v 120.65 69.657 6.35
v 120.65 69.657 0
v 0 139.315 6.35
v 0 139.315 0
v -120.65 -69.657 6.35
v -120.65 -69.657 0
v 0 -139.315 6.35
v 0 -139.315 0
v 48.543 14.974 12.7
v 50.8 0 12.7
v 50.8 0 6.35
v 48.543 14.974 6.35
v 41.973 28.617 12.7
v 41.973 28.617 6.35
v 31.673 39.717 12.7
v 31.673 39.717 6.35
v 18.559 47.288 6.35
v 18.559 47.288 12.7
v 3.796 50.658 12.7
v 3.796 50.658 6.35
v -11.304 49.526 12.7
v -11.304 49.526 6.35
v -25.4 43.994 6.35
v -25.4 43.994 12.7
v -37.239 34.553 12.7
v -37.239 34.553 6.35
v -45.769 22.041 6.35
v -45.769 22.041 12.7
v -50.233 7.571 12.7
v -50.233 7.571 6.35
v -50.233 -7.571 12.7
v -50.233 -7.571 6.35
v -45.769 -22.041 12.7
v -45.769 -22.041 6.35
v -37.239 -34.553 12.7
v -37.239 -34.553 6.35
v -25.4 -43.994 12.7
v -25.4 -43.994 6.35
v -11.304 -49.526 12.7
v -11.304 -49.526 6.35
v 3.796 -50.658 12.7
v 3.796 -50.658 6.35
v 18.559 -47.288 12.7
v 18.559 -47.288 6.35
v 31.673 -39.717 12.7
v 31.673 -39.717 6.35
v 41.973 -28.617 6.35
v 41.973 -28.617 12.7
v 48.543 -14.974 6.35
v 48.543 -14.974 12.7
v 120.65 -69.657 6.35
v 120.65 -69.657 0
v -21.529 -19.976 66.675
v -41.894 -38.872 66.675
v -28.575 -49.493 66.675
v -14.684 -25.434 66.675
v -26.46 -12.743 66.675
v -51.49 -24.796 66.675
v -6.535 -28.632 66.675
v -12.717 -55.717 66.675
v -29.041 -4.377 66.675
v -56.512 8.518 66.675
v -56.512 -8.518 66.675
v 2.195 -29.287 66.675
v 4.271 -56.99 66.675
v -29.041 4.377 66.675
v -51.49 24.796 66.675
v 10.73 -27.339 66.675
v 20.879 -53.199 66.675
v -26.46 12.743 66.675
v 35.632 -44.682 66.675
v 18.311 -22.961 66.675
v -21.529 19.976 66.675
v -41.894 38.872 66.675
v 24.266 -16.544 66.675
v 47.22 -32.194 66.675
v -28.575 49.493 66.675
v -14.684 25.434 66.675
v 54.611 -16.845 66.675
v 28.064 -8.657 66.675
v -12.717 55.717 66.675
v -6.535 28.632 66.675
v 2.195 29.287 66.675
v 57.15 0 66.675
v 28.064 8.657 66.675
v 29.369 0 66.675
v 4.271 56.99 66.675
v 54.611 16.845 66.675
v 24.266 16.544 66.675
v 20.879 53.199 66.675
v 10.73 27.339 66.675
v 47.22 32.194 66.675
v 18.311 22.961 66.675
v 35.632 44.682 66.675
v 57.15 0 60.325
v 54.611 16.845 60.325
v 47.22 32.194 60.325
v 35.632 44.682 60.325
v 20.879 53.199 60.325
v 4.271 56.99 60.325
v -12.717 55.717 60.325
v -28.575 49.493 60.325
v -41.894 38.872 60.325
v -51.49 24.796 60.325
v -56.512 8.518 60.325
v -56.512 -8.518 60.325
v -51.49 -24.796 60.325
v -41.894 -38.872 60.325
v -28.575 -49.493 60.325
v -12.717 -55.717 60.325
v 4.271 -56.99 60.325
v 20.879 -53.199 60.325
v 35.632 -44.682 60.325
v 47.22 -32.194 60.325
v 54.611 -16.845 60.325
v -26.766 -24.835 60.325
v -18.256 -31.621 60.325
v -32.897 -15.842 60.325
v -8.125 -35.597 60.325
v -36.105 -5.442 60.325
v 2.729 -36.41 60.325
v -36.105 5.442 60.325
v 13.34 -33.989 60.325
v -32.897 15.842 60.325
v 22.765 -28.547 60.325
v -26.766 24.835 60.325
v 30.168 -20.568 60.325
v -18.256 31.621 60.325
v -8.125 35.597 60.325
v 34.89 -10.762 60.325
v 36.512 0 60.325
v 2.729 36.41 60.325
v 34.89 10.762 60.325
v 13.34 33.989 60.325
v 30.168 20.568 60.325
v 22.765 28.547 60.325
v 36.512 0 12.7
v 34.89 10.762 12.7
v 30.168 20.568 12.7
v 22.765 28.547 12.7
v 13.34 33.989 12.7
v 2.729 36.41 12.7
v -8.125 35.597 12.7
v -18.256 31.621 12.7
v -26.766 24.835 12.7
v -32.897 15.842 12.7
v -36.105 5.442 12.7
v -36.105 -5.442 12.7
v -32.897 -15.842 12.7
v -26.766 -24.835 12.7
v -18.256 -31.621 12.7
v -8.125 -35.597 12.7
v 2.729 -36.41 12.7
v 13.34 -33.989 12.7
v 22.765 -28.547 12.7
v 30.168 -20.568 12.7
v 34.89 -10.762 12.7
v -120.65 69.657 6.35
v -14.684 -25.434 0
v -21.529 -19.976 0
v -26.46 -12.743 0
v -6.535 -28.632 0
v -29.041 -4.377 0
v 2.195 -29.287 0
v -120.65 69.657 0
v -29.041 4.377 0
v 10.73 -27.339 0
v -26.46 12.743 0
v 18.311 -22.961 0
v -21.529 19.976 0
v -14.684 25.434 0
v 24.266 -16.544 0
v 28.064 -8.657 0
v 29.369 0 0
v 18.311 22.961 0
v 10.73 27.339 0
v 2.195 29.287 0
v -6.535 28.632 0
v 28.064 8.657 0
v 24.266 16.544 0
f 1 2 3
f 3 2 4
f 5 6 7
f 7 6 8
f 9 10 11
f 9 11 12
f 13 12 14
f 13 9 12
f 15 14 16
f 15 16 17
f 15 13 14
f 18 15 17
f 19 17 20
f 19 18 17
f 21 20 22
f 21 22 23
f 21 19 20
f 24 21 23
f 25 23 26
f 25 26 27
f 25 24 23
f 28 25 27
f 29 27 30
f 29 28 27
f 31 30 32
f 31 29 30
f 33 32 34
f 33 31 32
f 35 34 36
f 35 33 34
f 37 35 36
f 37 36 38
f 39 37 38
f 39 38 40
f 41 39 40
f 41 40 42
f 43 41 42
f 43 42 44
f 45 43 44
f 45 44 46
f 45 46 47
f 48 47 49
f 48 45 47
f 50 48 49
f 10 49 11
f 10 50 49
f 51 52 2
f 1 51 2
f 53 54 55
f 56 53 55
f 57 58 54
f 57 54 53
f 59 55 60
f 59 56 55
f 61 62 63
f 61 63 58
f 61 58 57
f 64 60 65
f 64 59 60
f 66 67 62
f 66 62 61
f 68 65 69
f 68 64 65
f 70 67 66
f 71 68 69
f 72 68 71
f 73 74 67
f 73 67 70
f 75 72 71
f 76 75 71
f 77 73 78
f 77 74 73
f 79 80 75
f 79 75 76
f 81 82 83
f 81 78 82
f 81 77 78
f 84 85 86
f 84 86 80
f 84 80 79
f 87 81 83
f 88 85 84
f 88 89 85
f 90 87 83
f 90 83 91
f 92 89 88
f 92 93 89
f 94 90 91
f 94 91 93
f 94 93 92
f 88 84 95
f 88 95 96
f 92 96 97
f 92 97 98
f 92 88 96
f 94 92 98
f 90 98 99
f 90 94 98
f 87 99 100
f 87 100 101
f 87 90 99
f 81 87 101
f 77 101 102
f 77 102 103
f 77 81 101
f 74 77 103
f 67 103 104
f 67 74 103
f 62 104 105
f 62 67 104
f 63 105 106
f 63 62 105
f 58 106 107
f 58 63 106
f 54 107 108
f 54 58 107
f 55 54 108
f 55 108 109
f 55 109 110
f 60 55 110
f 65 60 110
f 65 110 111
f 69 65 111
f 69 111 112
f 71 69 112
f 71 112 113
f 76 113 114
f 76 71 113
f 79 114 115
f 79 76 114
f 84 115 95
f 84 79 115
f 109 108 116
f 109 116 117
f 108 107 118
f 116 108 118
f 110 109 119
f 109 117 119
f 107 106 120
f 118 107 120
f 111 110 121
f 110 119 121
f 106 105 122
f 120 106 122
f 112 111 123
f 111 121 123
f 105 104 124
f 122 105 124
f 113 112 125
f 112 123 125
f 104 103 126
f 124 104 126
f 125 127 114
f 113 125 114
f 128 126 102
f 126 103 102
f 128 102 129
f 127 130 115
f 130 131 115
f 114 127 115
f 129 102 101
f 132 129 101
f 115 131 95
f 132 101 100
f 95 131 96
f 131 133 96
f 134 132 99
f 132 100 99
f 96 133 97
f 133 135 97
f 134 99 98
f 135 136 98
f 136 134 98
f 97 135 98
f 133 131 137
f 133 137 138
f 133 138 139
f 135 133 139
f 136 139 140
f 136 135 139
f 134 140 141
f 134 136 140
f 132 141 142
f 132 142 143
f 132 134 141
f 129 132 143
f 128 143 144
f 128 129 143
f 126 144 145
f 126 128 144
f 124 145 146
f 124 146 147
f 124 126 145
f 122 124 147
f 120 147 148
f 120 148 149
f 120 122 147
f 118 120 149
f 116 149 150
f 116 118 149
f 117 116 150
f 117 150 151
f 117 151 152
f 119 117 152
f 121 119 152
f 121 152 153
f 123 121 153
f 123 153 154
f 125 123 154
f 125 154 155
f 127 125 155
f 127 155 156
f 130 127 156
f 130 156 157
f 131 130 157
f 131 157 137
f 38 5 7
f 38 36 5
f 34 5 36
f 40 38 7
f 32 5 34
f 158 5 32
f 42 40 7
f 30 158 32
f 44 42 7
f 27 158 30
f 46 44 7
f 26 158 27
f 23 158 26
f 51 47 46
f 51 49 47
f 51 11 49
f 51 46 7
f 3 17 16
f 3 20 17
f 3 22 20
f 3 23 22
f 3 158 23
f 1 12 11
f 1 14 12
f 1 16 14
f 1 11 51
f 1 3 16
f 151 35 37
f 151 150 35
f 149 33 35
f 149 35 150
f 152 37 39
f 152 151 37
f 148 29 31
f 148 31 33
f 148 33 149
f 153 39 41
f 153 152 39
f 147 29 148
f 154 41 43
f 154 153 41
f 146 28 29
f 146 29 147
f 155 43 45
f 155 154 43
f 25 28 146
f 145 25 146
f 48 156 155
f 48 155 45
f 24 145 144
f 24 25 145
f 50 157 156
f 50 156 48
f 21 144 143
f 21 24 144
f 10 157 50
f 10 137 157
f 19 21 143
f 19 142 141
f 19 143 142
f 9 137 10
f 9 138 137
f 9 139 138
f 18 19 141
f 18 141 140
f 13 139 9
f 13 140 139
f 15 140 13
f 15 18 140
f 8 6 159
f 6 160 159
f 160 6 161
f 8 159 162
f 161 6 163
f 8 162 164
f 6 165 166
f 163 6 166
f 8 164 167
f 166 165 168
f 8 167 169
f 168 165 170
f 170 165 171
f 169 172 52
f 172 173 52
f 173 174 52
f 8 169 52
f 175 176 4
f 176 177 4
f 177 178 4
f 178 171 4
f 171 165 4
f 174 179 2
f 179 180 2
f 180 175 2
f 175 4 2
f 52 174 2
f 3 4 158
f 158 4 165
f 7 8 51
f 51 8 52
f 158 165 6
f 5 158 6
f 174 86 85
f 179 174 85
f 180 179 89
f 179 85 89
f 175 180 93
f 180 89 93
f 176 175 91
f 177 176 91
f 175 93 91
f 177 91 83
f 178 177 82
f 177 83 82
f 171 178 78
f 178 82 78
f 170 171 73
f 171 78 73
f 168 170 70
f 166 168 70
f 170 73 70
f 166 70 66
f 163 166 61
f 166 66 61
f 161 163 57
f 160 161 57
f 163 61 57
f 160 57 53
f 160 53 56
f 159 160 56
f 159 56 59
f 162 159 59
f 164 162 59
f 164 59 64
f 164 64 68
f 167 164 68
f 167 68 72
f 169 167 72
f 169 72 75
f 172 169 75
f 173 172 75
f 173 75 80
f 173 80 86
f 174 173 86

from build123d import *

# Parameters (mm, degrees)
HEX_BASE_DEPTH      = 6.35
SKETCH2_R           = 29.36875
ID_2_DEPTH          = 185.405282824
PIPE_START          = 53.975
SKETCH3_R           = 36.5125
SKETCH3_R_2         = 29.36875
PIPE_DEPTH          = 53.975
FLANGE_START        = 6.35
SKETCH4_R           = 57.15
SKETCH4_R_2         = 29.36875
FLANGE_DEPTH        = 6.35
REINFORCEMENT_START = 6.35
SKETCH5_R           = 50.8
SKETCH5_R_2         = 36.5125
REINFORCEMENT_DEPTH = 6.35


with BuildPart() as part:
    # Sketch1 → hex_base (new body)
    with BuildSketch(Plane.XY):
        Polygon((120.65, 69.657309978), (0, 139.314619955), (-120.65, 69.657309978), (-120.65, -69.657309978), (0, -139.314619955), (120.65, -69.657309978), align=None)
    extrude(amount=HEX_BASE_DEPTH)

    # Sketch2 → ID 2 (cut, through all)
    with BuildSketch(Plane.XY.offset(6.35)):
        Circle(SKETCH2_R)
    extrude(amount=-ID_2_DEPTH, mode=Mode.SUBTRACT)

    # Sketch3 → pipe (add)
    with BuildSketch(Plane.XY.offset(6.35).offset(PIPE_START)):
        Circle(SKETCH3_R)
        Circle(SKETCH3_R_2, mode=Mode.SUBTRACT)
    extrude(amount=-PIPE_DEPTH)

    # Sketch4 → flange (add)
    with BuildSketch(Plane.XY.offset(60.325).offset(FLANGE_START)):
        Circle(SKETCH4_R)
        Circle(SKETCH4_R_2, mode=Mode.SUBTRACT)
    extrude(amount=-FLANGE_DEPTH)

    # Sketch5 → reinforcement (add)
    with BuildSketch(Plane.XY.offset(6.35).offset(REINFORCEMENT_START)):
        Circle(SKETCH5_R)
        Circle(SKETCH5_R_2, mode=Mode.SUBTRACT)
    extrude(amount=-REINFORCEMENT_DEPTH)


solid = part.part
